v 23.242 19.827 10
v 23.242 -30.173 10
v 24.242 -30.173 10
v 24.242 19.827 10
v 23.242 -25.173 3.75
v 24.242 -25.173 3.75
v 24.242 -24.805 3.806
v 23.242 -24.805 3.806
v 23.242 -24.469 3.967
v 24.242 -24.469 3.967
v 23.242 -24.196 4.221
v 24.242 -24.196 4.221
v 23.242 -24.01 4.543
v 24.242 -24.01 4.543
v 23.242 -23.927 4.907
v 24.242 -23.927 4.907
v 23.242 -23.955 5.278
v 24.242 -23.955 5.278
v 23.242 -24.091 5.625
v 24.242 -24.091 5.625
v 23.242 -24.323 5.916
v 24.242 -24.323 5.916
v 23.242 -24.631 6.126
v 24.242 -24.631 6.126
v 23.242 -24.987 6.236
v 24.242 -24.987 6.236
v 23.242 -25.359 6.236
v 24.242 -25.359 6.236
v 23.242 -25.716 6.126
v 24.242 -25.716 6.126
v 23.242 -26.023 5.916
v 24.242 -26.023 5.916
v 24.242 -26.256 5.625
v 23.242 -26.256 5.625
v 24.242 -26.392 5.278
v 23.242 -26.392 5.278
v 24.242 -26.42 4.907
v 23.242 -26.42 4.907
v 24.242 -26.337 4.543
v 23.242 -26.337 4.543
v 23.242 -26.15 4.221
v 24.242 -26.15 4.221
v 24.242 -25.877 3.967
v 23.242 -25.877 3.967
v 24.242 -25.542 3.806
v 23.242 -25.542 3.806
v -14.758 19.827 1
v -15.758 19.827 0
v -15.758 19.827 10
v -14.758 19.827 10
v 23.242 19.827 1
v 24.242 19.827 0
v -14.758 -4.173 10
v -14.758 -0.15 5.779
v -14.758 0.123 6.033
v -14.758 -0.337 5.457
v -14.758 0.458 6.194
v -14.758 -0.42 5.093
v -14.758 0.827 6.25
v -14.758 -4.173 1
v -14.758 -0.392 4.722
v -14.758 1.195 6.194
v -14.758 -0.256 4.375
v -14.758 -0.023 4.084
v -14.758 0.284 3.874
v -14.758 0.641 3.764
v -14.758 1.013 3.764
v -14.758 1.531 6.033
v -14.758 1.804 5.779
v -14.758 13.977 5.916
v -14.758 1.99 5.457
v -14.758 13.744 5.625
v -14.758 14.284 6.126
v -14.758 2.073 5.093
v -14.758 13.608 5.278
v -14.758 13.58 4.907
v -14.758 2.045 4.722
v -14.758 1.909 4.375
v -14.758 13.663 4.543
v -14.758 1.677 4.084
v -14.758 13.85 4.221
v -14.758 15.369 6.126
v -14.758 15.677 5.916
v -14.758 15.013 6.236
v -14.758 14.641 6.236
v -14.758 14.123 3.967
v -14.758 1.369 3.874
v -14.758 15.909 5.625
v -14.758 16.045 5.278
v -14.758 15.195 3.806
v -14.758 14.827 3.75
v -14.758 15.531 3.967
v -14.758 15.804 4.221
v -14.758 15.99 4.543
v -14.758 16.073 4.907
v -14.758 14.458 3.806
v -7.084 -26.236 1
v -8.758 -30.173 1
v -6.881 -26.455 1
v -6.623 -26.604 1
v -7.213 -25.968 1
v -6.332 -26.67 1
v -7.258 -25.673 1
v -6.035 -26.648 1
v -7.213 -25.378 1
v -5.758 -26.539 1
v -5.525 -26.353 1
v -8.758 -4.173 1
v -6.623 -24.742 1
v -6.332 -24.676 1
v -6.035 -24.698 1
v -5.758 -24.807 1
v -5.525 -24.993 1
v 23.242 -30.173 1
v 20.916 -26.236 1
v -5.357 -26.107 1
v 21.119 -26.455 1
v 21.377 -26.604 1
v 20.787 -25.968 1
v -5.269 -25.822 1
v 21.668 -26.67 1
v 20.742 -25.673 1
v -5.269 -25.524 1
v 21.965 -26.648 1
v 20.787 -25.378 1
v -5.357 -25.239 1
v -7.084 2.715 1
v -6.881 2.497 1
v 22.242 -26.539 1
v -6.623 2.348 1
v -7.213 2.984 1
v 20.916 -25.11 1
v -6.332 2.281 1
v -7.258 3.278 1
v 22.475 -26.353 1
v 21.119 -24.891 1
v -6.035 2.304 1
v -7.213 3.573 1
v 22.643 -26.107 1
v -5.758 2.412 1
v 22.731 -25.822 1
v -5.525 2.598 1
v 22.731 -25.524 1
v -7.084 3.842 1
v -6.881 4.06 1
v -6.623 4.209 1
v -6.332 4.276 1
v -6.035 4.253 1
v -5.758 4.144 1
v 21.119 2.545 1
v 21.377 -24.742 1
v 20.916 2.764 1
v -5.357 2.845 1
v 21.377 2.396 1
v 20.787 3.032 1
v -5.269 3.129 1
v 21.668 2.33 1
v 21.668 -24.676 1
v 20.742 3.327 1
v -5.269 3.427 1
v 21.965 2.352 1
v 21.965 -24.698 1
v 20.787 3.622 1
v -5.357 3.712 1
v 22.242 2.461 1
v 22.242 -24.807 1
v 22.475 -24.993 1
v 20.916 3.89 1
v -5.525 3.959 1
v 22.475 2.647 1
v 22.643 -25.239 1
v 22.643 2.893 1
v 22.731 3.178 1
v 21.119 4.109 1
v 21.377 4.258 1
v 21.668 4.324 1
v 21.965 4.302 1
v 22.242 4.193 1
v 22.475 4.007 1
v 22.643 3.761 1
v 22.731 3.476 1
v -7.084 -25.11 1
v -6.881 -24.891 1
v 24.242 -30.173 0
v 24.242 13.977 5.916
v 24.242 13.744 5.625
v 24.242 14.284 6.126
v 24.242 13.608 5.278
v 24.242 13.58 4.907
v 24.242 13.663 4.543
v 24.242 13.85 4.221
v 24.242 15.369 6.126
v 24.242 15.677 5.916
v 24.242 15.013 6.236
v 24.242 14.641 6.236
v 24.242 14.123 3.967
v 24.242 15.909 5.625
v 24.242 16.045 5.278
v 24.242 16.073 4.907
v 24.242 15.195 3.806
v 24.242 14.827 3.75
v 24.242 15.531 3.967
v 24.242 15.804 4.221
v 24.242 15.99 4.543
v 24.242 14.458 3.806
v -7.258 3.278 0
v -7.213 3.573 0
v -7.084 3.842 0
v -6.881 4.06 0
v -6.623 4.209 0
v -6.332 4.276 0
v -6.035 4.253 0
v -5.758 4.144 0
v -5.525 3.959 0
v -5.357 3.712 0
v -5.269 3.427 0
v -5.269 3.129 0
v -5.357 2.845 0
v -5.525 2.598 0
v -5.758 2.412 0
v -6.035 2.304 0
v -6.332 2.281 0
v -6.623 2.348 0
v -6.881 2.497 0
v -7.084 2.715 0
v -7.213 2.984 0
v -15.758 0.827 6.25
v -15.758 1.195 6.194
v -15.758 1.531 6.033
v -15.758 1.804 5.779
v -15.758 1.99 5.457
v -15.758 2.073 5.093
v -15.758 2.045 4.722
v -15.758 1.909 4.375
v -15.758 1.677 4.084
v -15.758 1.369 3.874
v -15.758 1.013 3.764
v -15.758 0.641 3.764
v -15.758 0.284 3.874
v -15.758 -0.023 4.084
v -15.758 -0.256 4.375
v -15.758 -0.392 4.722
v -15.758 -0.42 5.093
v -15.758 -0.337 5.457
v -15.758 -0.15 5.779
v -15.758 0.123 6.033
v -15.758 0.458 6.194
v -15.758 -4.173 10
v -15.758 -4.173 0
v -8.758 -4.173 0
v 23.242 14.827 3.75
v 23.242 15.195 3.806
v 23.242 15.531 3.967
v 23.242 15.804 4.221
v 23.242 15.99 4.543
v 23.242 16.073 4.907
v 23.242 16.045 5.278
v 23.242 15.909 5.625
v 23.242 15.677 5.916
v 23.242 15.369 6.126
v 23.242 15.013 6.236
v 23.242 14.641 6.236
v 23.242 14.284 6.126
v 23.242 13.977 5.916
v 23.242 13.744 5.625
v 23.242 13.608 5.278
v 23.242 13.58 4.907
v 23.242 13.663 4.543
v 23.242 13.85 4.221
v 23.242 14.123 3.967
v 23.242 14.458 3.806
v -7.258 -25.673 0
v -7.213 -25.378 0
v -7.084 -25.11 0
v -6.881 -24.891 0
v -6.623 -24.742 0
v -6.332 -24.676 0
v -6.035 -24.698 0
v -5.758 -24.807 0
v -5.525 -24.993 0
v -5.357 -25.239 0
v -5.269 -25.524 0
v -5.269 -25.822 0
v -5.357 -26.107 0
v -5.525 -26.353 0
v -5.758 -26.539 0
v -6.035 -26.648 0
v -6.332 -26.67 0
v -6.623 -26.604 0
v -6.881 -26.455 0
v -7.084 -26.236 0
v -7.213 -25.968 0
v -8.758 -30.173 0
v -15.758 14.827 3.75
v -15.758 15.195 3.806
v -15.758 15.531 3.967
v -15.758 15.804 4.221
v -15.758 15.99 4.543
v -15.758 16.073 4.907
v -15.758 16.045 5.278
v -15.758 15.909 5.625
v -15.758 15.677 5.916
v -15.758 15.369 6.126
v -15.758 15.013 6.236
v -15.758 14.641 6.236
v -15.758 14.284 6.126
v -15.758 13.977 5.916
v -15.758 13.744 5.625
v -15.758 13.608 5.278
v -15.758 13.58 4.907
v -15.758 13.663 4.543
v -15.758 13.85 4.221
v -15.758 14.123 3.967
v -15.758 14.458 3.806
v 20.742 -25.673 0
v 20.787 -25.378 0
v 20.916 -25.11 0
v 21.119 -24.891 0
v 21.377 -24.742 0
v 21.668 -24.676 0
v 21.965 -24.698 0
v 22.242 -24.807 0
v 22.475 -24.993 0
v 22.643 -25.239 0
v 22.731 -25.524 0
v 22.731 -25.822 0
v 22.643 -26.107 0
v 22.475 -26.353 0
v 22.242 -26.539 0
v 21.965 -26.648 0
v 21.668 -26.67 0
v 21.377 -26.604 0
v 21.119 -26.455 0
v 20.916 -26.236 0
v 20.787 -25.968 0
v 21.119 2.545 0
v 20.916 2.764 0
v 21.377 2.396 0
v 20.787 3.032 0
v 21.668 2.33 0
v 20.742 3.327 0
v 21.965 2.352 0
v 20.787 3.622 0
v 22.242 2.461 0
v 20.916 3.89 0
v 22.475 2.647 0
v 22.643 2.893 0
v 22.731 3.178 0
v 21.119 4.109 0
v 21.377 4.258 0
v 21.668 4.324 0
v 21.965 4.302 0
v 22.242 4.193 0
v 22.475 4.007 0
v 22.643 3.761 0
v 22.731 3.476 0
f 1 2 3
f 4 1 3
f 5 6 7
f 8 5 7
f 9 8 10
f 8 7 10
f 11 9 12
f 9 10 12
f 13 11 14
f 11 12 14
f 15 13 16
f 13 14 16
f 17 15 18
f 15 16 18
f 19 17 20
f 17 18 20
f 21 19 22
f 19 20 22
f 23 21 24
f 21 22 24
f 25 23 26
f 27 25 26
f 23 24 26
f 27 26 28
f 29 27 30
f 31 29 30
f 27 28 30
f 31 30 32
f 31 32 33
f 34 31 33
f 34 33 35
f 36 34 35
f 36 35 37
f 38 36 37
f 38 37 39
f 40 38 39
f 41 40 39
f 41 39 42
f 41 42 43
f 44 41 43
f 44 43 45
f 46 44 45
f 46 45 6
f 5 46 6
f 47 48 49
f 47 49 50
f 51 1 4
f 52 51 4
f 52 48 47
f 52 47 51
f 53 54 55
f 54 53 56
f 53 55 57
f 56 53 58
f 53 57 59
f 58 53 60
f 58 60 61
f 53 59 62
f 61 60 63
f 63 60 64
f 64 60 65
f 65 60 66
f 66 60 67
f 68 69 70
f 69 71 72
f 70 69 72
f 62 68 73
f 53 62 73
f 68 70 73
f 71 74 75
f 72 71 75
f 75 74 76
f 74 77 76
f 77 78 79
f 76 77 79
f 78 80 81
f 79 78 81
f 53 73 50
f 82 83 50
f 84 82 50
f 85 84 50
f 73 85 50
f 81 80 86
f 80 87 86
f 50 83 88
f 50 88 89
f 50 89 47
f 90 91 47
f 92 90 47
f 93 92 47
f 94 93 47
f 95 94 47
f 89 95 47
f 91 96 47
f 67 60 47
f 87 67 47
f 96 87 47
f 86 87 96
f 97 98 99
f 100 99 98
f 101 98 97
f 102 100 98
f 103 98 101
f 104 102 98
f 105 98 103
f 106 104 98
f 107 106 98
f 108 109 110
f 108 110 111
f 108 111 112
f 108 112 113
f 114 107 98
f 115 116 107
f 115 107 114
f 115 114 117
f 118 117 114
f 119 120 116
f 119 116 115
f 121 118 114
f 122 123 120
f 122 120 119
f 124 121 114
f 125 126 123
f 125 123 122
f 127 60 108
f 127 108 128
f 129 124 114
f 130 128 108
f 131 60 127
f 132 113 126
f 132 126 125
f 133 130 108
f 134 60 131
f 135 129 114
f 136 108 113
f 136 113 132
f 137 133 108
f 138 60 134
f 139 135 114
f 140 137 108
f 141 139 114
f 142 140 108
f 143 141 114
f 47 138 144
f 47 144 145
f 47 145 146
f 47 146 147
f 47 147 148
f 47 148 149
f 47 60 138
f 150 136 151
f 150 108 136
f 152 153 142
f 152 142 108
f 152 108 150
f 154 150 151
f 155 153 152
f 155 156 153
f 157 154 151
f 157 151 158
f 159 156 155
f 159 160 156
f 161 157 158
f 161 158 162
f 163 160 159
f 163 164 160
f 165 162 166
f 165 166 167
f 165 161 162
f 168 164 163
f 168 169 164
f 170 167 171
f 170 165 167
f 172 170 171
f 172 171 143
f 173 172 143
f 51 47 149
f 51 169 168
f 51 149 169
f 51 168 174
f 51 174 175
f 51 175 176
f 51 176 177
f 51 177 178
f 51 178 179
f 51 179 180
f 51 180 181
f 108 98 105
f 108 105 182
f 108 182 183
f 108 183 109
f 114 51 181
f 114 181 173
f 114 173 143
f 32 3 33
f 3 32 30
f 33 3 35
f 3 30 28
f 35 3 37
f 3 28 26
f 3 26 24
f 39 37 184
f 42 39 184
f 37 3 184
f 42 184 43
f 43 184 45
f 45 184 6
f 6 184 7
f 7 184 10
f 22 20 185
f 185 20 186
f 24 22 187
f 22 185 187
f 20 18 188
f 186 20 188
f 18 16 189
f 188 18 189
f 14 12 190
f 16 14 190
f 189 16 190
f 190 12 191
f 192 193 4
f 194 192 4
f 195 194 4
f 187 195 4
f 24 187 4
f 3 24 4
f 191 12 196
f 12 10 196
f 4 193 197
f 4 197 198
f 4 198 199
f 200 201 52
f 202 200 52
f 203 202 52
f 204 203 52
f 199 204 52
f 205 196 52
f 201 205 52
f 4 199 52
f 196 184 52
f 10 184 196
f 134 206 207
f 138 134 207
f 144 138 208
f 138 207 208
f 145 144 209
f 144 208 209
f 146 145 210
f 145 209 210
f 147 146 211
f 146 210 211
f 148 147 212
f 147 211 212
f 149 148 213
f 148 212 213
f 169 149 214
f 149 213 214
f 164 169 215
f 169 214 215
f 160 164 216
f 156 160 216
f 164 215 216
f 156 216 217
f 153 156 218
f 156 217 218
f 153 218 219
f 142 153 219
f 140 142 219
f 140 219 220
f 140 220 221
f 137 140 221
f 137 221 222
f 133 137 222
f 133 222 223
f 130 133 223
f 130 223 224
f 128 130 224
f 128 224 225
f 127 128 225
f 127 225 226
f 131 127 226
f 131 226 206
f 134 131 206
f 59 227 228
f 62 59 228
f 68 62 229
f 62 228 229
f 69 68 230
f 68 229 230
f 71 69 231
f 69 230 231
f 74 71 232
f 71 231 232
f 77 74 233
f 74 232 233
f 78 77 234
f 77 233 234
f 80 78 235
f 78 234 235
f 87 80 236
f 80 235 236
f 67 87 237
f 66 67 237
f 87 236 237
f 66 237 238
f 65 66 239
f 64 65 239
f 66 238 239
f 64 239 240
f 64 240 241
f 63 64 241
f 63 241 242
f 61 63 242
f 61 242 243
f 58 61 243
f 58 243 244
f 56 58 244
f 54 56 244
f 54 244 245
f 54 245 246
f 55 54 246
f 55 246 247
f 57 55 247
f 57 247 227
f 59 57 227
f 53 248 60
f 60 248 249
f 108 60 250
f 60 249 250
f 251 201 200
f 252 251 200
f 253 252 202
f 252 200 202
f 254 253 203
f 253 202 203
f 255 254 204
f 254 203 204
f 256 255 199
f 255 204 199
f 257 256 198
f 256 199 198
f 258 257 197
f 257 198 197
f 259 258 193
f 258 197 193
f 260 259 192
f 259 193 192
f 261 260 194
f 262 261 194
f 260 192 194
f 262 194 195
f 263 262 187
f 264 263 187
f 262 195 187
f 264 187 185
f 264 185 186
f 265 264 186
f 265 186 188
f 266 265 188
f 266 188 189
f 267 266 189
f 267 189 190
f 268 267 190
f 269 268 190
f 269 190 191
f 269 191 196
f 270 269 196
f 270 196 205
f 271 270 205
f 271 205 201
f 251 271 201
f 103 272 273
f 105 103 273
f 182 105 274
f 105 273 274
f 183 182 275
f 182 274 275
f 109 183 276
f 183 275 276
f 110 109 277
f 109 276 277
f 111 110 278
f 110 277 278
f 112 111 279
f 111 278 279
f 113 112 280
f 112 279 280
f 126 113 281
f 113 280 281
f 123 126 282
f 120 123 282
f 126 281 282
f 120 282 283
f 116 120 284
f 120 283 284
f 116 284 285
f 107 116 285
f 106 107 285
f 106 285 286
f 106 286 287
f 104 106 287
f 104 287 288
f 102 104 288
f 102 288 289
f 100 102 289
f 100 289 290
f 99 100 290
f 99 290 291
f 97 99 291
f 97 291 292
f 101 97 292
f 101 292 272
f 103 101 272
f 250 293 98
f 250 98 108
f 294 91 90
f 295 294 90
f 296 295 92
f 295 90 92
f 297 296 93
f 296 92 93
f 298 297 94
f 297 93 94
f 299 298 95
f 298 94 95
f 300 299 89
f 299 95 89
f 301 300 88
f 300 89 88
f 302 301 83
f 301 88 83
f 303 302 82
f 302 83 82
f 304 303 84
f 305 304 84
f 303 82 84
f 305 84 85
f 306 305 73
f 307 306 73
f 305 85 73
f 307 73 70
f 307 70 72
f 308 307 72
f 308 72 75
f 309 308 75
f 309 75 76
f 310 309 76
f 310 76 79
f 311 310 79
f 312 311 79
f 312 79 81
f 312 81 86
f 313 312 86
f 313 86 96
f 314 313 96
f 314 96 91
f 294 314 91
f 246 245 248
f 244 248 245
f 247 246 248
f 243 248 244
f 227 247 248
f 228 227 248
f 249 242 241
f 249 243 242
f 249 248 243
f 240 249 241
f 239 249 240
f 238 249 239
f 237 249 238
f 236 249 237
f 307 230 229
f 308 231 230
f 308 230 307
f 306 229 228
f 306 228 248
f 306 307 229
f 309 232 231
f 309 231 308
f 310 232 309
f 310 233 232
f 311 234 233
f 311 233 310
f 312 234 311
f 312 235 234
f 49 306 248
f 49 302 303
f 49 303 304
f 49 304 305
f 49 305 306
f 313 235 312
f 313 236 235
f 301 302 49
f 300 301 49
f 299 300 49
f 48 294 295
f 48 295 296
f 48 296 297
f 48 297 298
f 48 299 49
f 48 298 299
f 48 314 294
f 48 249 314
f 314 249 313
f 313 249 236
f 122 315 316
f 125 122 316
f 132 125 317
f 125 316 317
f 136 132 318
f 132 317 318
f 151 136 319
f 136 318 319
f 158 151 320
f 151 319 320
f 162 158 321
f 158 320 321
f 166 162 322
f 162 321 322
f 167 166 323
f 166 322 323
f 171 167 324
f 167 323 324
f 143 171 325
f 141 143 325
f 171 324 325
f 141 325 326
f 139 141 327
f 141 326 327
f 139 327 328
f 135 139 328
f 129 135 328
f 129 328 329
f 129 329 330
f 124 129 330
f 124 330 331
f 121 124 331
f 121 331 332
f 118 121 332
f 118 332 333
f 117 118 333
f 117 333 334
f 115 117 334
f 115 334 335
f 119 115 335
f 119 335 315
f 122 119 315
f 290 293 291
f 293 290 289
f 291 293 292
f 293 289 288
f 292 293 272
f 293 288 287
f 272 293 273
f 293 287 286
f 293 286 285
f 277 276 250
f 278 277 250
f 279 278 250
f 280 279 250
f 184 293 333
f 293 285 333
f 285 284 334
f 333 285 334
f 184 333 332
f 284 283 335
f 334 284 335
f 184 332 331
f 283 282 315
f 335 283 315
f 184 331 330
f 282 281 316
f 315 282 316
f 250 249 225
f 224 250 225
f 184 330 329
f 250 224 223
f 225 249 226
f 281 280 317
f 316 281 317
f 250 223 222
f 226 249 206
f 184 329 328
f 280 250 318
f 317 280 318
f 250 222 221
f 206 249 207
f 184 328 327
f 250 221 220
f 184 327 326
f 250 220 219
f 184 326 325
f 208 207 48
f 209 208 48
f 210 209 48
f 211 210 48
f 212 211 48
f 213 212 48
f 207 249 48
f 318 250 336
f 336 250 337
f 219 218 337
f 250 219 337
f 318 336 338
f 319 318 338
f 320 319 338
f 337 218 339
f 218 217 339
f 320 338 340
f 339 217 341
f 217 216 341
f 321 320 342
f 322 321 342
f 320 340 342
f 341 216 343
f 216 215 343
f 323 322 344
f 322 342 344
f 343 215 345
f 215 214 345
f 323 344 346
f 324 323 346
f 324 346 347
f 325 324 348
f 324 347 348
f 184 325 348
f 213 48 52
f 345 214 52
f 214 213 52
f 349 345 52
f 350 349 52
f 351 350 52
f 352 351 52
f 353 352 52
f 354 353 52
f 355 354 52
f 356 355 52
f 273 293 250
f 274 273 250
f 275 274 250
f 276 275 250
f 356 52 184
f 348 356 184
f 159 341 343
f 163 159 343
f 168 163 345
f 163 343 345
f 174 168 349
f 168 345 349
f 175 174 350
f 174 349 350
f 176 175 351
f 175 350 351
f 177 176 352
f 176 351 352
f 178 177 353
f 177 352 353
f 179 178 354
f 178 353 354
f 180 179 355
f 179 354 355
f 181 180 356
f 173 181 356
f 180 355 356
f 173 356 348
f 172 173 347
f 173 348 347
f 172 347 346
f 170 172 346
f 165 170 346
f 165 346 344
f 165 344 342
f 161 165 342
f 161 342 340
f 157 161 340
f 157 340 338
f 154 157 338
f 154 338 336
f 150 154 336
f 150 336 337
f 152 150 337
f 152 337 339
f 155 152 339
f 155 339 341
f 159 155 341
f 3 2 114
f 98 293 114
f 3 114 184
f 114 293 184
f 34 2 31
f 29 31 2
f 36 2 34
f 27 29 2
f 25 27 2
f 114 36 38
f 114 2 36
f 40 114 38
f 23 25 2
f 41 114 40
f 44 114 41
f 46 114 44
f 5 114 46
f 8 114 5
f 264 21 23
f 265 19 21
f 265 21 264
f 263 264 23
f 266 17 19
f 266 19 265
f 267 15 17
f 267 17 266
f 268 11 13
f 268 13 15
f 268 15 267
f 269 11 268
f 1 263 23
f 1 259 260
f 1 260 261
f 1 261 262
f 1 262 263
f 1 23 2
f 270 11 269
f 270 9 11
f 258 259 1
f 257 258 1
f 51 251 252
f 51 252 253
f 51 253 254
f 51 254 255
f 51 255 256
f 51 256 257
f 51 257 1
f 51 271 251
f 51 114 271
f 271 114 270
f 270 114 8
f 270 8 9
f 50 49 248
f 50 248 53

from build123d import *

# Parameters (mm, degrees)
SKETCH1_W            = 40
SKETCH1_H            = 50
BOSS_EXTRUDE1_DEPTH  = 1
SKETCH2_W            = 5
SKETCH2_H            = 25
CUT_EXTRUDE1_DEPTH   = 1
SKETCH3_W            = 1
SKETCH3_H            = 25
BOSS_EXTRUDE2_DEPTH  = 10
SKETCH4_R            = 1.25
CUT_EXTRUDE3_DEPTH   = 63
SKETCH5_R            = 1.25
BOSS_EXTRUDE3_DEPTH  = 1
SKETCH6_W            = 40
SKETCH6_H            = 10
CUT_EXTRUDE4_DEPTH   = 9
SKETCH7_R            = 1.25
CUT_EXTRUDE5_DEPTH   = 53
SKETCH8_W            = 2
SKETCH8_H            = 25
CUT_EXTRUDE6_DEPTH   = 53
SKETCH9_W            = 7
SKETCH9_H            = 2
CUT_EXTRUDE8_DEPTH   = 53
SKETCH10_W           = 9
SKETCH10_H           = 20.650485051
BOSS_EXTRUDE4_DEPTH  = 1
SKETCH11_R           = 1.25
CUT_EXTRUDE9_DEPTH   = 1
SKETCH12_R           = 1.25
BOSS_EXTRUDE5_DEPTH  = 1
SKETCH13_R           = 1.25
BOSS_EXTRUDE6_DEPTH  = 1
SKETCH14_W           = 7
SKETCH14_H           = 1
BOSS_EXTRUDE7_DEPTH  = 1
SKETCH15_W           = 1
SKETCH15_H           = 9
BOSS_EXTRUDE8_DEPTH  = 9
SKETCH16_R           = 1.25
CUT_EXTRUDE10_DEPTH  = 9
SKETCH17_W           = 1
SKETCH17_H           = 31.406889679
BOSS_EXTRUDE9_DEPTH  = 9
SKETCH18_R           = 1.25
CUT_EXTRUDE11_DEPTH  = 9
SKETCH19_W           = 33
SKETCH19_H           = 1
BOSS_EXTRUDE10_DEPTH = 9
SKETCH20_R           = 1.25
CUT_EXTRUDE12_DEPTH  = 9
SKETCH21_R           = 1
CUT_EXTRUDE13_DEPTH  = 10
SKETCH22_W           = 33
SKETCH22_H           = 1
CUT_EXTRUDE14_DEPTH  = 9
SKETCH23_W           = 1
SKETCH23_H           = 1
BOSS_EXTRUDE11_DEPTH = 9


with BuildPart() as part:
    # Sketch1 → Boss-Extrude1 (new body)
    with BuildSketch(Plane.XY):
        with Locations((4.242424242, -5.173160173)):
            Rectangle(SKETCH1_W, SKETCH1_H)
    extrude(amount=BOSS_EXTRUDE1_DEPTH)

    # Sketch2 → Cut-Extrude1 (cut)
    with BuildSketch(Plane.XY.offset(1)):
        with Locations((-13.257575758, -17.673160173)):
            Rectangle(SKETCH2_W, SKETCH2_H)
    extrude(amount=-CUT_EXTRUDE1_DEPTH, mode=Mode.SUBTRACT)

    # Sketch3 → Boss-Extrude2 (add)
    with BuildSketch(Plane(origin=(0, 0, 0), x_dir=(-1, 0, 0), z_dir=(0, 0, -1))):
        with Locations((15.257575758, 7.326839827)):
            Rectangle(SKETCH3_W, SKETCH3_H)
        with Locations((-23.742424242, 7.326839827)):
            Rectangle(SKETCH3_W, SKETCH3_H)
    extrude(amount=-BOSS_EXTRUDE2_DEPTH)

    # Sketch4 → Cut-Extrude3 (cut)
    with BuildSketch(Plane(origin=(24.242424242, 0, 0), x_dir=(0, 0, -1), z_dir=(1, 0, 0))):
        with Locations((-5, -0.173160173)):
            Circle(SKETCH4_R)
        with Locations((-5, 14.826839827)):
            Circle(SKETCH4_R)
    extrude(amount=-CUT_EXTRUDE3_DEPTH, mode=Mode.SUBTRACT)

    # Sketch5 → Boss-Extrude3 (add)
    with BuildSketch(Plane(origin=(24.242424242, 0, 0), x_dir=(0, 0, -1), z_dir=(1, 0, 0))):
        with Locations((-5, -0.173160173)):
            Circle(SKETCH5_R)
    extrude(amount=-BOSS_EXTRUDE3_DEPTH)

    # Sketch6 → Cut-Extrude4 (cut)
    with BuildSketch(Plane.XY.offset(10)):
        with Locations((4.242424242, -0.173160173)):
            Rectangle(SKETCH6_W, SKETCH6_H)
    extrude(amount=-CUT_EXTRUDE4_DEPTH, mode=Mode.SUBTRACT)

    # Sketch7 → Cut-Extrude5 (cut)
    with BuildSketch(Plane.ZY.offset(15.757575758)):
        with Locations((5, 9.826839827)):
            Circle(SKETCH7_R)
    extrude(amount=-CUT_EXTRUDE5_DEPTH, mode=Mode.SUBTRACT)

    # Sketch8 → Cut-Extrude6 (cut)
    with BuildSketch(Plane.XY.offset(1)):
        with Locations((-9.757575758, -17.673160173)):
            Rectangle(SKETCH8_W, SKETCH8_H)
    extrude(amount=-CUT_EXTRUDE6_DEPTH, mode=Mode.SUBTRACT)

    # Sketch9 → Cut-Extrude8 (cut)
    with BuildSketch(Plane.XY.offset(1)):
        with Locations((-12.257575758, -4.173160173)):
            Rectangle(SKETCH9_W, SKETCH9_H)
    extrude(amount=-CUT_EXTRUDE8_DEPTH, mode=Mode.SUBTRACT)

    # Sketch10 → Boss-Extrude4 (add)
    with BuildSketch(Plane(origin=(24.242424242, 0, 0), x_dir=(0, 0, -1), z_dir=(1, 0, 0))):
        with Locations((-5.5, -5.498402699)):
            Rectangle(SKETCH10_W, SKETCH10_H)
    extrude(amount=-BOSS_EXTRUDE4_DEPTH)

    # Sketch11 → Cut-Extrude9 (cut)
    with BuildSketch(Plane(origin=(24.242424242, 0, 0), x_dir=(0, 0, -1), z_dir=(1, 0, 0))):
        with Locations((-5, -10.823645224)):
            Circle(SKETCH11_R)
    extrude(amount=-CUT_EXTRUDE9_DEPTH, mode=Mode.SUBTRACT)

    # Sketch12 → Boss-Extrude5 (add)
    with BuildSketch(Plane(origin=(24.242424242, 0, 0), x_dir=(0, 0, -1), z_dir=(1, 0, 0))):
        with Locations((-5, 9.826839827)):
            Circle(SKETCH12_R)
    extrude(amount=-BOSS_EXTRUDE5_DEPTH)

    # Sketch13 → Boss-Extrude6 (add)
    with BuildSketch(Plane.ZY.offset(15.757575758)):
        with Locations((5, 9.826839827)):
            Circle(SKETCH13_R)
    extrude(amount=-BOSS_EXTRUDE6_DEPTH)

    # Sketch14 → Boss-Extrude7 (add)
    with BuildSketch(Plane.XY.offset(1)):
        with Locations((-12.257575758, -3.673160173)):
            Rectangle(SKETCH14_W, SKETCH14_H)
    extrude(amount=-BOSS_EXTRUDE7_DEPTH)

    # Sketch15 → Boss-Extrude8 (add)
    with BuildSketch(Plane.XY.offset(1)):
        with Locations((-15.257575758, 0.326839827)):
            Rectangle(SKETCH15_W, SKETCH15_H)
    extrude(amount=BOSS_EXTRUDE8_DEPTH)

    # Sketch16 → Cut-Extrude10 (cut)
    with BuildSketch(Plane.ZY.offset(15.757575758)):
        with Locations((5, 14.826839827)):
            Circle(SKETCH16_R)
        with Locations((5, 0.826839827)):
            Circle(SKETCH16_R)
    extrude(amount=-CUT_EXTRUDE10_DEPTH, mode=Mode.SUBTRACT)

    # Sketch17 → Boss-Extrude9 (add)
    with BuildSketch(Plane.XY.offset(1)):
        with Locations((23.742424242, -14.469715334)):
            Rectangle(SKETCH17_W, SKETCH17_H)
    extrude(amount=BOSS_EXTRUDE9_DEPTH)

    # Sketch18 → Cut-Extrude11 (cut)
    with BuildSketch(Plane(origin=(24.242424242, 0, 0), x_dir=(0, 0, -1), z_dir=(1, 0, 0))):
        with Locations((-5, -25.173160173)):
            Circle(SKETCH18_R)
    extrude(amount=-CUT_EXTRUDE11_DEPTH, mode=Mode.SUBTRACT)

    # Sketch19 → Boss-Extrude10 (add)
    with BuildSketch(Plane.XY.offset(1)):
        with Locations((7.742424242, -29.673160173)):
            Rectangle(SKETCH19_W, SKETCH19_H)
    extrude(amount=BOSS_EXTRUDE10_DEPTH)

    # Sketch20 → Cut-Extrude12 (cut)
    with BuildSketch(Plane.XZ.offset(30.173160173)):
        with Locations((-3.757575758, 5)):
            Circle(SKETCH20_R)
        with Locations((19.242424242, 5)):
            Circle(SKETCH20_R)
    extrude(amount=-CUT_EXTRUDE12_DEPTH, mode=Mode.SUBTRACT)

    # Sketch21 → Cut-Extrude13 (cut)
    with BuildSketch(Plane(origin=(0, 0, 0), x_dir=(-1, 0, 0), z_dir=(0, 0, -1))):
        with Locations((-21.742424242, 3.326839827)):
            Circle(SKETCH21_R)
        with Locations((6.257575758, 3.27845273)):
            Circle(SKETCH21_R)
        with Locations((6.257575758, -25.673160173)):
            Circle(SKETCH21_R)
        with Locations((-21.742424242, -25.673160173)):
            Circle(SKETCH21_R)
    extrude(amount=-CUT_EXTRUDE13_DEPTH, mode=Mode.SUBTRACT)

    # Sketch22 → Cut-Extrude14 (cut)
    with BuildSketch(Plane.XY.offset(10)):
        with Locations((7.742424242, -29.673160173)):
            Rectangle(SKETCH22_W, SKETCH22_H)
    extrude(amount=-CUT_EXTRUDE14_DEPTH, mode=Mode.SUBTRACT)

    # Sketch23 → Boss-Extrude11 (add)
    with BuildSketch(Plane.XY.offset(1)):
        with Locations((23.742424242, -29.673160173)):
            Rectangle(SKETCH23_W, SKETCH23_H)
    extrude(amount=BOSS_EXTRUDE11_DEPTH)


solid = part.part
